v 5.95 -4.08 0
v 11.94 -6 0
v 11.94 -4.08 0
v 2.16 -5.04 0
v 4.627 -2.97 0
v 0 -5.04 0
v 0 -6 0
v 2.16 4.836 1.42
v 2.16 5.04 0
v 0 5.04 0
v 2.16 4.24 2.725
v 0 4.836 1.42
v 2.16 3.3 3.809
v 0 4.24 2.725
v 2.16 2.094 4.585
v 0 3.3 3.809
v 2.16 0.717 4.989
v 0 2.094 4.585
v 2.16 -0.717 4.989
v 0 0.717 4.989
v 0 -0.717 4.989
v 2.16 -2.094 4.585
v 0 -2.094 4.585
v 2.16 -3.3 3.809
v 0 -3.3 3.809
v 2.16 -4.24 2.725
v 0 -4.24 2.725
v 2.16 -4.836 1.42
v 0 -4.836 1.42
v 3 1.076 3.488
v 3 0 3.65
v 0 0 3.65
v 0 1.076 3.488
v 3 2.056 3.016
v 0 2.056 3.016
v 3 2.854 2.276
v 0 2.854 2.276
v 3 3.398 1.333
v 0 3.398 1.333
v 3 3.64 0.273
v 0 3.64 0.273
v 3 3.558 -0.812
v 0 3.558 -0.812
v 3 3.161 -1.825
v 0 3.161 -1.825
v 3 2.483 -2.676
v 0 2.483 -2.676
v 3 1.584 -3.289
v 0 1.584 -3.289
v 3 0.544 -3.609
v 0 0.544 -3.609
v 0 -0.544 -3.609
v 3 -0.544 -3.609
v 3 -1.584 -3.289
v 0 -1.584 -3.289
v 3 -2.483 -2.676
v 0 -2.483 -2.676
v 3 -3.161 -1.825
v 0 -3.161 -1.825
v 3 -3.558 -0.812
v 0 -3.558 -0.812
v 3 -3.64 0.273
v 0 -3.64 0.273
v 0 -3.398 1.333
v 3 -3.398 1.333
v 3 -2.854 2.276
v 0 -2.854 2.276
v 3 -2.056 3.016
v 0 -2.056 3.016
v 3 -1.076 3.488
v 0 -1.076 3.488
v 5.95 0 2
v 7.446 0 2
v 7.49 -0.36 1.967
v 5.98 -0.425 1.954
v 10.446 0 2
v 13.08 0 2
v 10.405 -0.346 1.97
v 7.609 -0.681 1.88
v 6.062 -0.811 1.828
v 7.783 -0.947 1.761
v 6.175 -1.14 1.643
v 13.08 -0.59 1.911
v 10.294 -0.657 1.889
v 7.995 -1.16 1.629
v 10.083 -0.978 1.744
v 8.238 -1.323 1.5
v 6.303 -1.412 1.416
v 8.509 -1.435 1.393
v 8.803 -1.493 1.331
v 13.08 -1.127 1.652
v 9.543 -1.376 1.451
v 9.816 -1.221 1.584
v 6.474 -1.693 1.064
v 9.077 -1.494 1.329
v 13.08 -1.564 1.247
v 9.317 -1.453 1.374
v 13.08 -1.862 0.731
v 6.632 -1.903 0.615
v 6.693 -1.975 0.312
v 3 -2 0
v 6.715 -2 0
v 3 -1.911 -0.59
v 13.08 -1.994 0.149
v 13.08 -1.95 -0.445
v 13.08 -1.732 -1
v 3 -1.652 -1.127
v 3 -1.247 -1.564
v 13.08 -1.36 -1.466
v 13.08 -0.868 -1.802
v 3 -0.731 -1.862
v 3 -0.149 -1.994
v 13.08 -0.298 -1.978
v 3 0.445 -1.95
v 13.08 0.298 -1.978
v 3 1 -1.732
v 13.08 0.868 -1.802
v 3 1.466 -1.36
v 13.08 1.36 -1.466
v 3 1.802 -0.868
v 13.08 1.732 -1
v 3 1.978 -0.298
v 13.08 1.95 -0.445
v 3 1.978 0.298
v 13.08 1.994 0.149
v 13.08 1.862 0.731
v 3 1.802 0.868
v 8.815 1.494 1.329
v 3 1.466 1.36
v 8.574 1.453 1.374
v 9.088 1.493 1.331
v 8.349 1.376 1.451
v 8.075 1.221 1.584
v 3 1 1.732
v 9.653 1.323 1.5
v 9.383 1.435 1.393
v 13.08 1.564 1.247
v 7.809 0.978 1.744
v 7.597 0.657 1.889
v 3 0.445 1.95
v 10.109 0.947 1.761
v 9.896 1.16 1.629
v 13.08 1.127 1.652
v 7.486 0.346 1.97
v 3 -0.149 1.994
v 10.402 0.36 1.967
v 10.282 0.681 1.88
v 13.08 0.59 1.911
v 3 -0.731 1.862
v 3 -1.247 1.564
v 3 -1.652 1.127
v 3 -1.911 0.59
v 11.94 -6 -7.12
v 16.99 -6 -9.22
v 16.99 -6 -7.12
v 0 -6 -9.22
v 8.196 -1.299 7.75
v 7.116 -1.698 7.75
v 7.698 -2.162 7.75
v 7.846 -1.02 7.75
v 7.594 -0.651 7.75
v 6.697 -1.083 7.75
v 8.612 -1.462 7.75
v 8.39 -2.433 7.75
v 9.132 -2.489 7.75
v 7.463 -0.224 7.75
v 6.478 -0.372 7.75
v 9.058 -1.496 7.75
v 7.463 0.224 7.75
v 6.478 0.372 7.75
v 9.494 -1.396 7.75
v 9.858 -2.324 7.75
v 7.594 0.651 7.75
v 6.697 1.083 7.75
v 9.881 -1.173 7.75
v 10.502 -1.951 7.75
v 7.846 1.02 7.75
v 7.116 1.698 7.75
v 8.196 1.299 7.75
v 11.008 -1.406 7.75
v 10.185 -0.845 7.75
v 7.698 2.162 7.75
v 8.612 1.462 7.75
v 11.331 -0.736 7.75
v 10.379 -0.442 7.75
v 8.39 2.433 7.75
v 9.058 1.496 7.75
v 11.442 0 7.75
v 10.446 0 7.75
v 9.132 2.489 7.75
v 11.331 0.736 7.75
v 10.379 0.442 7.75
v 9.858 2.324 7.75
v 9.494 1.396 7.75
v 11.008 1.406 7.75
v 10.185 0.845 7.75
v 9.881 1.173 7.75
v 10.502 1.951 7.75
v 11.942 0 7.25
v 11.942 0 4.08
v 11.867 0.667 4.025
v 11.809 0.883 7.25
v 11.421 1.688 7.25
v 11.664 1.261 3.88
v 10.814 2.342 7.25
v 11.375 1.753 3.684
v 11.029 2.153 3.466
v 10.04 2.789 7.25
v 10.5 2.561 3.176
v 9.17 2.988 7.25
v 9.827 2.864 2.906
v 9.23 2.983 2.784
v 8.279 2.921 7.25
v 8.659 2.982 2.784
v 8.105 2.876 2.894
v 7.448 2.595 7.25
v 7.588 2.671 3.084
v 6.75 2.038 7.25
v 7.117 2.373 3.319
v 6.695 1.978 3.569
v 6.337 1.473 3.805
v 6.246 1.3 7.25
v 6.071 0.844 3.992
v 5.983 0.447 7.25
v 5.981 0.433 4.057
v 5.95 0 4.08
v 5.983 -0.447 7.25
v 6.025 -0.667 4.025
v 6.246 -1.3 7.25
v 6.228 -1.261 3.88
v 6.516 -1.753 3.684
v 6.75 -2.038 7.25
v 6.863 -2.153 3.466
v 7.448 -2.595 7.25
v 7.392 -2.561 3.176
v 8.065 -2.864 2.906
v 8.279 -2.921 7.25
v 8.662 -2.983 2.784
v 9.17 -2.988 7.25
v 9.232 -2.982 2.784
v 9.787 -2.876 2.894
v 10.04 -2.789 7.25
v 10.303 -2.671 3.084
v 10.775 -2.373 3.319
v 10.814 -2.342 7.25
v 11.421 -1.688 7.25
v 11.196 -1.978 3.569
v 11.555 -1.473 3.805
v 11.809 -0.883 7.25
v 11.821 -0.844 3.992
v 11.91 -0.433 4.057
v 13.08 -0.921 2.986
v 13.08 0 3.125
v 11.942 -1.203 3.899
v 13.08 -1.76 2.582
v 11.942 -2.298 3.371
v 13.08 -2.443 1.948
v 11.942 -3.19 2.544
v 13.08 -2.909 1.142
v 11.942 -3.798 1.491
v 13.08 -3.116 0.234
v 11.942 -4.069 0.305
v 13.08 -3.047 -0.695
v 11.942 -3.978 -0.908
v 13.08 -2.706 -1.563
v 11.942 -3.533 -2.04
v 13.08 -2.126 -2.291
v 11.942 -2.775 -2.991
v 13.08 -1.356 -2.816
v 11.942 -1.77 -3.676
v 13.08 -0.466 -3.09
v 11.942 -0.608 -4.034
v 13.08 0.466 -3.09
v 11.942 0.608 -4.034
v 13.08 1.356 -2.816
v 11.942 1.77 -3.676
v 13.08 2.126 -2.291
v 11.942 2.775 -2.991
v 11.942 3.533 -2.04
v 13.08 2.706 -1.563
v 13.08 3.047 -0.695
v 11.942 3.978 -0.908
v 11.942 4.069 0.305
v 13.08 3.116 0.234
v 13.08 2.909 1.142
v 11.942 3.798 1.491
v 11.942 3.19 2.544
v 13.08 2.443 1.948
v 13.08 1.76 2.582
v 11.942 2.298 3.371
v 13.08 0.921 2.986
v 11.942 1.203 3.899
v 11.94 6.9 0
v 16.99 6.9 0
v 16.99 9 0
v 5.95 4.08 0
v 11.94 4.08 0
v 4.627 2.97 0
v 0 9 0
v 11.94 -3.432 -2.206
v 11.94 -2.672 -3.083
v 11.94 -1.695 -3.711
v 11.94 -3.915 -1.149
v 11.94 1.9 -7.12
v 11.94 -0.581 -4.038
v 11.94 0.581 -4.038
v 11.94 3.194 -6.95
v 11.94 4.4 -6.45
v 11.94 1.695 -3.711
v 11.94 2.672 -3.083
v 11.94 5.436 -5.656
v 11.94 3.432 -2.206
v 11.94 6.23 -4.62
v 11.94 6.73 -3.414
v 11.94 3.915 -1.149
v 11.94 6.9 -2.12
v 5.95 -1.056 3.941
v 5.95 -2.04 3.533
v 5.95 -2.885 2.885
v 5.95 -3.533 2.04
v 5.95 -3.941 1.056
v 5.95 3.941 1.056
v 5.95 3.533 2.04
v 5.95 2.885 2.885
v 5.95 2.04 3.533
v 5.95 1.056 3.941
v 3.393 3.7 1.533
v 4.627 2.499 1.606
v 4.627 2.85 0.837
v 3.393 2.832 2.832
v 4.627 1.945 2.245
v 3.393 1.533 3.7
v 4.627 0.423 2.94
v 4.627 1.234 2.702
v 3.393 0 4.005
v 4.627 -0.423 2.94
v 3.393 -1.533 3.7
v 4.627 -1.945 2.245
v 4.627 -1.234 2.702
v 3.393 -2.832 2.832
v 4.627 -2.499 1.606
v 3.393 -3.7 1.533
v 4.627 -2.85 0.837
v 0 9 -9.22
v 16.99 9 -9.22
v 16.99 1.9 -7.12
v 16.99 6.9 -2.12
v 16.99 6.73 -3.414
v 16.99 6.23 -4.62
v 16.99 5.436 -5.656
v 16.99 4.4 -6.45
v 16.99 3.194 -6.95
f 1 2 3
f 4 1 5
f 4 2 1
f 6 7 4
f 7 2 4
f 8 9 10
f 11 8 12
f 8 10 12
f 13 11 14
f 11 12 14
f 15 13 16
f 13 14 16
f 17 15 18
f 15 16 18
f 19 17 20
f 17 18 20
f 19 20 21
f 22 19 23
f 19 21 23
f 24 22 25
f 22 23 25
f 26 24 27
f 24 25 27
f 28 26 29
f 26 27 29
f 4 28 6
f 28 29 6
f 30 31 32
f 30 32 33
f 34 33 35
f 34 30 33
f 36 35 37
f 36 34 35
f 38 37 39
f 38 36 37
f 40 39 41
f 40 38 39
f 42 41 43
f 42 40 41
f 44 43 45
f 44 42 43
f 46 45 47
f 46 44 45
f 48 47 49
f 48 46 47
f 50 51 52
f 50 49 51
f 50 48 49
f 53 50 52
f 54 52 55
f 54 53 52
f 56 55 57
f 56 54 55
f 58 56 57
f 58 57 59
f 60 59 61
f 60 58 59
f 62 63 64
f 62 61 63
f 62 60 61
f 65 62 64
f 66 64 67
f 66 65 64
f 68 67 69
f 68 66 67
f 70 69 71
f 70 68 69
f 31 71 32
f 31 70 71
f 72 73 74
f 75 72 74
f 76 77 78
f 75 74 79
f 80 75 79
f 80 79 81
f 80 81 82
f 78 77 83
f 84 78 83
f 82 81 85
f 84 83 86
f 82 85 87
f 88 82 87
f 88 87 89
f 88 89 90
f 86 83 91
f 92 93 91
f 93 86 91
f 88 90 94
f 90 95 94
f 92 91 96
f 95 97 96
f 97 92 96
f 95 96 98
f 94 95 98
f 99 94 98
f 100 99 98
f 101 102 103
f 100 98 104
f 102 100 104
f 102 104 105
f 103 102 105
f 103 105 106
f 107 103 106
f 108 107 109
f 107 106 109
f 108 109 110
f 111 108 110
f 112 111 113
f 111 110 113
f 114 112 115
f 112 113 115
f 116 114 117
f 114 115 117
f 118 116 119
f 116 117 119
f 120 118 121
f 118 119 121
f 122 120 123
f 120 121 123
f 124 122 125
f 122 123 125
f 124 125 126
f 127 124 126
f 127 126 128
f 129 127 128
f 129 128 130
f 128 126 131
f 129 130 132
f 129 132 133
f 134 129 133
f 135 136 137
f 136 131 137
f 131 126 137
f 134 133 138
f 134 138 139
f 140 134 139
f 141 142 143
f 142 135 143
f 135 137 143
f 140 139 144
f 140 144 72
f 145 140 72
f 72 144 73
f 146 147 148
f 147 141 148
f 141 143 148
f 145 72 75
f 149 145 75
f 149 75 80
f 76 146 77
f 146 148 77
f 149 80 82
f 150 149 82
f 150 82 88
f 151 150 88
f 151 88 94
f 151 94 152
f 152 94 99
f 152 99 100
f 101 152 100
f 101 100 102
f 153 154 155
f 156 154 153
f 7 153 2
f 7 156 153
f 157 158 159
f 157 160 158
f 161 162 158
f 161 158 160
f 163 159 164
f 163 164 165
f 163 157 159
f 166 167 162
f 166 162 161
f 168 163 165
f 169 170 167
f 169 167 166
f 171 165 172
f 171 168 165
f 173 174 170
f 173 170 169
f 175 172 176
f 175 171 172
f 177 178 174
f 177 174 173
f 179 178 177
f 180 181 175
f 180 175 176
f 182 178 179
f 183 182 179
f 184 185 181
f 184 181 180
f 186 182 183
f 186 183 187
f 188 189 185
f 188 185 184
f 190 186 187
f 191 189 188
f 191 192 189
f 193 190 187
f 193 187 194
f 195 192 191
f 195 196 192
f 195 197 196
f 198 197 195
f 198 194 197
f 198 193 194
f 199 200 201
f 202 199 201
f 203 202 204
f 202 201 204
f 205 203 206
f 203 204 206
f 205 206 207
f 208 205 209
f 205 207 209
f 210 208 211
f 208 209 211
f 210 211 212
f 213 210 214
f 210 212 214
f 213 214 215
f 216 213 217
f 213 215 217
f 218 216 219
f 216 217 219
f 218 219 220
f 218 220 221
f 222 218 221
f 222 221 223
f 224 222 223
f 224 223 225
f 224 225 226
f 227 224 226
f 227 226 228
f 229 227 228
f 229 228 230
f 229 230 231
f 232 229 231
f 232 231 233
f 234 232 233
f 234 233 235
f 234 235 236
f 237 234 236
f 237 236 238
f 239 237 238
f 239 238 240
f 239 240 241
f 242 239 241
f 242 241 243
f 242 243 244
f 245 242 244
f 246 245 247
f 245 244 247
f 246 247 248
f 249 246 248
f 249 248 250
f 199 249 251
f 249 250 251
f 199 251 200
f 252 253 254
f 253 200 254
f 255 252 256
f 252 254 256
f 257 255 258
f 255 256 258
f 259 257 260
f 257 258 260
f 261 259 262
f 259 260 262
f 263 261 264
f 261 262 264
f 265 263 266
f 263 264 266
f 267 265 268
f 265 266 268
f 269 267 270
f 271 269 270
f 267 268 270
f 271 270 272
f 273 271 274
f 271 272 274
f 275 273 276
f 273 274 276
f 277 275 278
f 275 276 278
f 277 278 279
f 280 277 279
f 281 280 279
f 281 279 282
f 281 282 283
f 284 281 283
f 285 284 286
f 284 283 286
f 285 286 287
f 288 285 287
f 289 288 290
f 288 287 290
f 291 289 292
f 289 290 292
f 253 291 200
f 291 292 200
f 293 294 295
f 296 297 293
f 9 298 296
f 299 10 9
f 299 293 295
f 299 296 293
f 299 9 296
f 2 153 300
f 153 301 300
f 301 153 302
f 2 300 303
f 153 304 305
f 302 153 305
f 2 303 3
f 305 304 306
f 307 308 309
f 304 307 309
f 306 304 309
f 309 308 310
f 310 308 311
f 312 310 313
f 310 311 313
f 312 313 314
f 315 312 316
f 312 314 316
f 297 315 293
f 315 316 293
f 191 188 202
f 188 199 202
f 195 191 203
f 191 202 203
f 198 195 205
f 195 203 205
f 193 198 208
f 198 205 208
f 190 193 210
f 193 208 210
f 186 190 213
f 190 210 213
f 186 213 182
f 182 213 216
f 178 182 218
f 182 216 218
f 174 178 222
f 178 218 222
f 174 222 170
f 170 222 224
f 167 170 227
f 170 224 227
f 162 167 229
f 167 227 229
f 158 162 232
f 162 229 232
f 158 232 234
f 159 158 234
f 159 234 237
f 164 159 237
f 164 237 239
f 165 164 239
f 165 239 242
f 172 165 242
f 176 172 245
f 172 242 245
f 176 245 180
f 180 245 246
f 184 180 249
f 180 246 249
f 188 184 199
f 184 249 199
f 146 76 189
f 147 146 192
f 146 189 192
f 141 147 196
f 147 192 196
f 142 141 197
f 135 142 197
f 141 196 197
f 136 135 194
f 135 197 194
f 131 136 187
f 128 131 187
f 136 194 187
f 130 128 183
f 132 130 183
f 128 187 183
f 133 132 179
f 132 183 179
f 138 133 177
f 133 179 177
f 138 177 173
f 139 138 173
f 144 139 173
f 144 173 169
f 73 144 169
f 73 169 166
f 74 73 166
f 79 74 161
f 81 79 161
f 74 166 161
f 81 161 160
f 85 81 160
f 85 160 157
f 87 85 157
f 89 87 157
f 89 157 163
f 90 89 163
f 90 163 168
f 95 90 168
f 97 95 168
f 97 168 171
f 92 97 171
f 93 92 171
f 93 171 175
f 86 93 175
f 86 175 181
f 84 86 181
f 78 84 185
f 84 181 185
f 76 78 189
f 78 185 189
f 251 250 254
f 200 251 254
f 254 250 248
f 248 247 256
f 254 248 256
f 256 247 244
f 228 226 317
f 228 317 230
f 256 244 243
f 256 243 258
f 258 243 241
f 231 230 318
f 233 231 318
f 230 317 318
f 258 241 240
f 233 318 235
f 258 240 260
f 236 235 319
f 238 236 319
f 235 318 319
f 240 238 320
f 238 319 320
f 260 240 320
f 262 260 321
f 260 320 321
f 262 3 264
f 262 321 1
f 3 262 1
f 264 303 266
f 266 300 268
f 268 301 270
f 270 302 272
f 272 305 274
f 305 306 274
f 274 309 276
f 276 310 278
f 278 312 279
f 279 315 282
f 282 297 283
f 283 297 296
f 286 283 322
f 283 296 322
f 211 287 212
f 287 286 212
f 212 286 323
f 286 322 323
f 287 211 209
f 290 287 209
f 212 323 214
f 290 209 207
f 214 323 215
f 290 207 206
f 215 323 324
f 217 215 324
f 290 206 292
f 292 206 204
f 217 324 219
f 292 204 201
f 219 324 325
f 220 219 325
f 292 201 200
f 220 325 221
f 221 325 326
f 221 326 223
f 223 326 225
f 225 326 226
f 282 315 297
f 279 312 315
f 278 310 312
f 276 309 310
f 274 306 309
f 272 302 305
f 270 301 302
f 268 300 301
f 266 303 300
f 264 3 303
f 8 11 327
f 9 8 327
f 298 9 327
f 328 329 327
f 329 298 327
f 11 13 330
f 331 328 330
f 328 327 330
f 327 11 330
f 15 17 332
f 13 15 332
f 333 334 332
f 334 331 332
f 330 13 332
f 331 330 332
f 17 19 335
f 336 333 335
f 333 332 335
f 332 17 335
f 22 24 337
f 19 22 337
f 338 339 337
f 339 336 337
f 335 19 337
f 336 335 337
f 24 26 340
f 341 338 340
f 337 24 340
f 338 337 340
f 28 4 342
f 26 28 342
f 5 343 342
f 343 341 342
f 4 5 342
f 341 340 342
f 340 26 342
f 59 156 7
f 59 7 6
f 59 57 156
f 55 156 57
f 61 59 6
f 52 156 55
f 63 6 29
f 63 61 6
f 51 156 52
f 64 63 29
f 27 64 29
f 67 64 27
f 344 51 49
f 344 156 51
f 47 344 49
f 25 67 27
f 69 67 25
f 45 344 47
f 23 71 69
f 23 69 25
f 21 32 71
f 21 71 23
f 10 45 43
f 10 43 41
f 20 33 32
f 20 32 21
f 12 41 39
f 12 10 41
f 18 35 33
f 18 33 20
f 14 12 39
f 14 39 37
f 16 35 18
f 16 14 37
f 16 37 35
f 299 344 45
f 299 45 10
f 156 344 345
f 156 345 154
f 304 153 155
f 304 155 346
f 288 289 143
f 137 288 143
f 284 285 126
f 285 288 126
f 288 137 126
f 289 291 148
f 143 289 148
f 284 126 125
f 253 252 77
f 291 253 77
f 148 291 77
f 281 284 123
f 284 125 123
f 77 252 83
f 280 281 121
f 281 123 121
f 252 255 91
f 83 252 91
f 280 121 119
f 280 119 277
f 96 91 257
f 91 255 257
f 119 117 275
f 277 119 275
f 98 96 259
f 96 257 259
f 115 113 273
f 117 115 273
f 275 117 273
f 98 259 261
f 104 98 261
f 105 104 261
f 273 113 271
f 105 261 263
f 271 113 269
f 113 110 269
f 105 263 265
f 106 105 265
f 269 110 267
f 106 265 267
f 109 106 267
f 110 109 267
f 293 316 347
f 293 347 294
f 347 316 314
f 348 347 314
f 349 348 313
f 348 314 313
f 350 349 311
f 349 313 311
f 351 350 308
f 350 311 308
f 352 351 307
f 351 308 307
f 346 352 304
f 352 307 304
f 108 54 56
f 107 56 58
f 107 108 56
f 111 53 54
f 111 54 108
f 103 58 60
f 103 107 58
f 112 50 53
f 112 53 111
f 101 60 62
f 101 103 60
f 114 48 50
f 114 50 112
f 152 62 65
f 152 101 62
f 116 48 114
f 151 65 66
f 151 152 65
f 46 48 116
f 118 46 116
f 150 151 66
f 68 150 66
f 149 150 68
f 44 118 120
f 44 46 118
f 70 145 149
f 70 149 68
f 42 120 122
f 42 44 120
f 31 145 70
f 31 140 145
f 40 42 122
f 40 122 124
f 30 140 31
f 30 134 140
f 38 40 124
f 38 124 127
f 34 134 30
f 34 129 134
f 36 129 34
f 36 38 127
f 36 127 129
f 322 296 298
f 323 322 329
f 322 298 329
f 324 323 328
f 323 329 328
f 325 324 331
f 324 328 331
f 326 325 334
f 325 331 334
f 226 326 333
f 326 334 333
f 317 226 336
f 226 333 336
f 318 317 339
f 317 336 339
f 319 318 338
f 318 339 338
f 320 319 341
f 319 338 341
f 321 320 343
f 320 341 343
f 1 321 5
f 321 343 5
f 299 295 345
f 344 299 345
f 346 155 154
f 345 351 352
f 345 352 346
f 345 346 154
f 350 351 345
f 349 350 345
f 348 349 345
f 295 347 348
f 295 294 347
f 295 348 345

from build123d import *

# Parameters (mm, degrees)
SKETCH2_R           = 2.996049
BOSS_EXTRUDE1_DEPTH = 7.75
SKETCH3_W           = 9.22
SKETCH3_H           = 15
BOSS_EXTRUDE2_DEPTH = 11.94
BOSS_EXTRUDE3_DEPTH = 5.05
FILLET1_START       = 11.94
FILLET1_DEPTH       = 5.05
SKETCH5_R           = 1.5
CUT_EXTRUDE1_DEPTH  = 7.75
SKETCH6_R           = 2
CUT_EXTRUDE2_DEPTH  = 13.08
CUT_EXTRUDE3_START  = -3
SKETCH7_R           = 3.65
CUT_EXTRUDE3_DEPTH  = 3


with BuildPart() as part:
    # Sketch1 → Revolve1 (revolve)
    with BuildSketch(Plane.XY, mode=Mode.PRIVATE) as revolve1_sk:
        Polygon((0, 3.65), (3, 3.65), (3, 2), (13.08, 2), (13.08, 3.125), (11.941875, 4.08), (5.949776, 4.08), (4.62693, 2.97), (2.16, 5.04), (0, 5.04), align=None)
    revolve(revolve1_sk.sketch.rotate(Axis((-0.163685, 0, 0), (1, 0, 0)), 90), axis=Axis((-0.163685, 0, 0), (1, 0, 0)))

    # Sketch2 → Boss-Extrude1 (add)
    with BuildSketch(Plane.XY):
        with Locations((8.945826, 0)):
            Circle(SKETCH2_R)
    extrude(amount=BOSS_EXTRUDE1_DEPTH)

    # Sketch3 → Boss-Extrude2 (add)
    with BuildSketch(Plane.ZY):
        with Locations((-4.61, 1.5)):
            Rectangle(SKETCH3_W, SKETCH3_H)
    extrude(amount=-BOSS_EXTRUDE2_DEPTH)

    # Sketch4 → Boss-Extrude3 (add)
    with BuildSketch(Plane(origin=(11.94, 0, 0), x_dir=(0, 0, -1), z_dir=(1, 0, 0))):
        Polygon((0, 9), (9.22, 9), (9.22, -6), (7.12, -6), (7.12, 6.9), (0, 6.9), align=None)
    extrude(amount=BOSS_EXTRUDE3_DEPTH)

    # Fillet1: read off the stored shape, not the designer's step
    # Fillet1 outline → Fillet1 (add)
    with BuildSketch(Plane.YZ.offset(FILLET1_START)):
        with BuildLine():
            ThreePointArc((6.9, -2.12), (5.435534, -5.655534), (1.9, -7.12))
            Line((1.9, -7.12), (6.9, -7.12))
            Line((6.9, -7.12), (6.9, -2.12))
        make_face()
    extrude(amount=FILLET1_DEPTH)

    # Chamfer1: read off the stored shape, not the designer's step
    # Chamfer1 outline → Chamfer1 (revolve, cut)
    with BuildSketch(Plane(origin=(8.945826, 0, 0), x_dir=(1, 0, 0), z_dir=(0, -1, 0))):
        Polygon((2.996049, 7.75), (2.496049, 7.75), (2.996049, 7.25), align=None)
    revolve(axis=Axis((8.945826, 0, 0), (0, 0, 1)), mode=Mode.SUBTRACT)

    # Sketch5 → Cut-Extrude1 (cut)
    with BuildSketch(Plane.XY.offset(7.75)):
        with Locations((8.945826, 0)):
            Circle(SKETCH5_R)
    extrude(amount=-CUT_EXTRUDE1_DEPTH, mode=Mode.SUBTRACT)

    # Sketch6 → Cut-Extrude2 (cut)
    with BuildSketch(Plane(origin=(13.08, 0, 0), x_dir=(0, 0, -1), z_dir=(1, 0, 0))):
        with Locations(Location((0, 0, 0), (0, 0, 180))):
            Circle(SKETCH6_R)
    extrude(amount=-CUT_EXTRUDE2_DEPTH, mode=Mode.SUBTRACT)

    # Sketch7 → Cut-Extrude3 (cut)
    with BuildSketch(Plane.ZY.offset(CUT_EXTRUDE3_START)):
        Circle(SKETCH7_R)
    extrude(amount=CUT_EXTRUDE3_DEPTH, mode=Mode.SUBTRACT)


solid = part.part
